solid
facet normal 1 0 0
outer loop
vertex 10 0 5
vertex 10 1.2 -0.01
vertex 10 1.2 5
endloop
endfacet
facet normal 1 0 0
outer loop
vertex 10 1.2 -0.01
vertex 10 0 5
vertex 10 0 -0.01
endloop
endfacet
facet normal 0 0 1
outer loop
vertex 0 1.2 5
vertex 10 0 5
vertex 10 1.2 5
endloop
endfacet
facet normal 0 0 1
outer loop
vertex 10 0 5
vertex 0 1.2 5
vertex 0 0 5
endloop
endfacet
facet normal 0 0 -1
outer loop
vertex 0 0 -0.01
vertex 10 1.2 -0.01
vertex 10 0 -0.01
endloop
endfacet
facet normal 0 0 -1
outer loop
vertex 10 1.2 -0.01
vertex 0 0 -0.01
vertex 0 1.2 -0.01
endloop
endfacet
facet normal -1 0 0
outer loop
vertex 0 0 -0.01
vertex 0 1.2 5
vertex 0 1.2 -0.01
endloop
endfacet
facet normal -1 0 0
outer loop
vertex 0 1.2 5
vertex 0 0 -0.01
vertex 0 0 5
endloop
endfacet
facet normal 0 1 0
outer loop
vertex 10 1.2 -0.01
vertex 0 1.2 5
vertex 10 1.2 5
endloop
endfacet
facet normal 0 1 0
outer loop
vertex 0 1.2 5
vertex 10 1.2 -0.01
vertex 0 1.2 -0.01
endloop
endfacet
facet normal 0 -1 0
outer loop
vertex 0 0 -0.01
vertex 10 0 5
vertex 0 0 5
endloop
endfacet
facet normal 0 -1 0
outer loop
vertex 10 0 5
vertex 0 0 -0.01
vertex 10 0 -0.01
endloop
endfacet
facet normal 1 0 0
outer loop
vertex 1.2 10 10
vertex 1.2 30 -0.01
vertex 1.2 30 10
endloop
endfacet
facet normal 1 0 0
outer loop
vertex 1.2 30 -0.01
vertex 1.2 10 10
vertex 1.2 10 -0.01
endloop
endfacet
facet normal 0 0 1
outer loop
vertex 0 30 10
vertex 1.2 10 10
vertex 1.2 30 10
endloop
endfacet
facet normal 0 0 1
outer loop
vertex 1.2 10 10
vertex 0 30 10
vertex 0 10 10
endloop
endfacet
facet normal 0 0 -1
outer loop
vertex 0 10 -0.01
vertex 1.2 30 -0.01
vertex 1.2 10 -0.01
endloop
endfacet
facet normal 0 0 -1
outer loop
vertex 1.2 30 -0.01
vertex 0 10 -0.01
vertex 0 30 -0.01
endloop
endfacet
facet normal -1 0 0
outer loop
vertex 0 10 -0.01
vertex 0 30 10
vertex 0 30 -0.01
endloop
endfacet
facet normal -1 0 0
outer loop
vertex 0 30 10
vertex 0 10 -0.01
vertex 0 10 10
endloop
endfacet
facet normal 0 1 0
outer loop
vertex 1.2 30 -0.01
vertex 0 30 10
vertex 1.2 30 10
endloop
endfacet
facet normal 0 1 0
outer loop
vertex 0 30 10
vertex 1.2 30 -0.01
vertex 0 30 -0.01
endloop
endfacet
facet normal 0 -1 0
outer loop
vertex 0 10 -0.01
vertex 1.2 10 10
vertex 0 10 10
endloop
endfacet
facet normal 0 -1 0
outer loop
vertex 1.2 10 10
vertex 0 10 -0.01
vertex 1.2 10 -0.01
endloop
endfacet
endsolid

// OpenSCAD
// file: ../../Base/Boxes.scad
// Fischertechnik Box Foundation
// Pre-designed Boxes

use <Constants.scad>

include <PlacementOptions.scad>

box190Width = 190;
box190Depth = 130;
box130Width = 130;
box130Depth = 95;
boxUsageHeight = 33.9;
boxWallThickness = 2.4;
boxBaseThickness = 1.0;

// getBoxWallThickness()
// Gets the wall thickness of a Fischertechnik Box

function getBoxWallThickness() = boxWallThickness;

// Gets the usable height of a fischertechnik box
function getBoxUsageHeight() = boxUsageHeight;

// Gets the thickness of the Fischertechnik box base.
function getBoxBaseThickness() = boxBaseThickness;

// Gets the usable inner space of a Box 190 as an x/y-list
function getBox190Space() = [
    box190Width - 2*getBoxWallThickness(), 
    box190Depth - 2*getBoxWallThickness() ];

// Imports the Fischertechnik empty box 130x190 mm and places it at position 0,0
// 190x130 are the outer sizes, the inner space is slightly smaller. Use getBox190Space() to get the inner sizes.
// This module needs the STL file "Fischertechnik Box 130x190.stl" in the library path.
// The box is positioned that the usable inner space is at the 0,0,0 position. The

module Box190() {
    translate([-getBoxWallThickness(),-getBoxWallThickness(),-getBoxBaseThickness()])
        import("Fischertechnik Box 130x190.stl", convexity=3);
}

// Gets the usable inner space of a Box 130 as an x/y-list
function getBox130Space() = [
    box130Width - 2*getBoxWallThickness(), 
    box130Depth - 2*getBoxWallThickness() ];

// Imports the Fischertechnik empty box 95x130 mm and places it at position 0,0
// 190x130 are the outer sizes, the inner space is slightly smaller. Use getBox190Space() to get the inner sizes.
// This module needs the STL file "Fischertechnik Box 95x130.stl" in the library path.
// The box is positioned that the usable inner space is at the 0,0,0 position. The

module Box130() {
    translate([-getBoxWallThickness(),-getBoxWallThickness(),-getBoxBaseThickness()])
        import("Fischertechnik Box 95x130.stl", convexity=3);
}

// Creates a web at the specified box walls
// corner 0 = LowerLeft, 1 = UpperLeft, 2 = UpperRight, 3 = LowerRight
// side 0 = LeftOfCorner, 1 = RightOfCorner
// distance = Distance in mm from the corner
// box = inner width and depth of the box (default: Box 190)
// webWidth = length of the web (default is 3 mms)
// webThickness = thickness of the web (default is 1 mm)

module BoxWeb(corner, side, distance, box=getBox190Space(), webWidth=3, webThickness=1.0) {
    sink = getBoxWallThickness()/2;

    width = (corner % 2 == 0) ? 
            (side == LeftOfCorner ? webWidth : webThickness) :
            (side == LeftOfCorner ? webThickness : webWidth);

    depth = (corner % 2 == 0) ? 
            (side == RightOfCorner ? webWidth : webThickness) :
            (side == RightOfCorner ? webThickness : webWidth);
    
    xDiff = corner == LowerLeft ? 
                (side == LeftOfCorner ? -sink : distance) :
            (corner == UpperLeft ?                
                (side == LeftOfCorner ? distance : -sink) :
            (corner == UpperRight ?
                (side == LeftOfCorner ? box.x-webWidth+sink : box.x-distance-webThickness) :
                (side == LeftOfCorner ? box.x-distance-webThickness: box.x-webWidth+sink)));

    yDiff = corner == LowerLeft ? 
                (side == RightOfCorner ? -sink : distance) :
            (corner == UpperLeft ?
                (side == RightOfCorner ? box.y-distance : box.y-webWidth+sink) :
            (corner == UpperRight ?
                (side == RightOfCorner ? box.y-webWidth+sink : box.y-distance) :
                (side == RightOfCorner ? distance : -sink)));
    
    translate([xDiff, yDiff, -getExcess()])
        cube([width, depth, boxUsageHeight + 2*getExcess()]);
}
// file: ../../Base/Rotation.scad
// Fischertechnik Box Foundation
// Geometry Helpers Rotation

include <PlacementOptions.scad>

// getRotatedSpace(space, rotation=NoRotation)
// Rotates the space dependent on the specified rotation

function getRotatedSpace(space, rotation=NoRotation) = [
    (rotation == Rotate90 || rotation == Rotate270) ? space.y : space.x,
    (rotation == Rotate90 || rotation == Rotate270) ? space.x : space.y
];

// Rotates the given space around the fixed left lower corner
// space = the space the children needs as width/depth list [width,depth]
// rotation = 0 Rotate0 degrees, 1 Rotate90 degrees, 2 Rotate180 degrees, 3 Rotate270 degrees (equivalent to -90)

module RotateFix(space, rotation=Rotate0) {
    dy = (rotation == Rotate0 || rotation == Rotate270) ? 0 :
        (rotation == Rotate90) ? space.x :
        space.y;
    dx = (rotation < Rotate180) ? 0 :
        (rotation == Rotate180) ? space.x :
        space.y;
    
    translate([dx, dy, 0])
        rotate([0, 0, rotations[rotation]])
            children();
}
// file: ../../Base/Alignment.scad
// Fischertechnik Box Foundation
// Geometry Helpers Alignment

include <PlacementOptions.scad>

// getAlignedX(elementWidth, spaceWidth, align=AlignRight, offset=0)
// Gets the aligned X offset of an element with the given
// width in the given space.
// elementWidth = The width of the element to positon
// spaceWidth = The space where the element should be aligned
// align = 0 AlignLeft, 1 AlignCenter, 2 AlignRight
// offset = an optional offset from the aligned position. When
// aligned left or centered, then positive values are in X direction.
// When aligned right then positive values are in negative X direction.

function getAlignedX(elementWidth, spaceWidth, align=AlignRight, offset=0) =
    (align == AlignLeft) ?
        offset :
        ((align == AlignCenter) ?
        (spaceWidth - elementWidth)/2 + offset :
        spaceWidth - offset - elementWidth);

// getAlignedY(elementDepth, spaceDepth, align=AlignTop, offset=0)
// Gets the aligned Y offset of an element with the given
// depth in the given space.
// elementDepth = The depth of the element to positon
// spaceDepth = The space where the element should be aligned
// align = 0 AlignBottom, 1 AlignCenter, 2 AlignTop
// offset = an optional offset from the aligned position. When
// aligned bottom or centered, then positive values are in Y direction.
// When aligned top then positive values are in negative Y direction.

function getAlignedY(elementDepth, spaceDepth, align=AlignTop, offset=0) =
    (align == AlignBottom) ?
        offset :
        ((align == AlignCenter) ?
        (spaceDepth - elementDepth)/2 + offset :
        spaceDepth - offset - elementDepth);
// file: ../../Base/PlacementOptions.scad
// Fischertechnik Box Foundation
// Placement Options

// Alignment
NoAlign = 0;
AlignLeft = 1;
AlignBottom = 2;
AlignCenter = 3;
AlignRight = 4;
AlignTop = 5;

// Element rotation degree steps
rotations = [0, -90, -180, -270];

// Rotation
NoRotation = 0;
Rotate0 = 0;
Rotate90 = 1;
Rotate180 = 2;
Rotate270 = 3;

// Docking (seen from above)
NoDock = -1;
DockLeft = 0;
DockTop = 1;
DockRight = 2;
DockCorner = 2;
DockBottom = 3;

// Web corners
LowerLeft = 0;
UpperLeft = 1;
UpperRight = 2;
LowerRight = 3;

// Web position relative to corner
LeftOfCorner = 0;
RightOfCorner = 1;
// file: ../../Base/Placement.scad
// Fischertechnik Box Foundation
// Geometry Helpers Placement

use <Constants.scad>
use <Alignment.scad>
use <Rotation.scad>
use <Boxes.scad>

include <PlacementOptions.scad>

// Place(x=0, y=0, elementSpace=[0,0], alignX=AlignLeft, alignY=AlignBottom, rotation=Rotate0, boxSpace=getBox190Space())
// Places the child at the specified position
// y = Y-Position. This is a relative position when an X aligment is specified.
// x = X-Position. This is a relative position when an Y aligment is specified.
// elementSpace = space of the element to be placed [x,y]
// alignX = -1=NoAlign, 0 AlignLeft, 1 AlignCenter, 3 AlignRight (elementSpace and boxSpace required!)
// alignY = -1=NoAlign, 2 AlignBottom, 1 AlignCenter, 4 AlignTop (elementSpace and boxSpace required!)
// rotation = 0 Rotate0 0 degrees, 1 Rotate90 90 degrees, 
// 2 Rotate180 180 degrees, 3 Rotate270 270 degrees (equivalent to -90)
// boxSpace = Inner space of the box where the placement occurs [x,y] - default is Box 190x130 inner space

module Place(x=0, y=0, elementSpace=[0,0], 
  alignX=AlignLeft, alignY=AlignBottom, 
  rotation=NoRotation, boxSpace=getBox190Space()) {

    module Position(x, y, space, rotation=Rotate0) {
        translate([x, y, 0])
            RotateFix(space, rotation)
                children(0);
    }

    space = getRotatedSpace(elementSpace, rotation);
    alignedX = getAlignedX(space.x, boxSpace.x, alignX, x);
    alignedY = getAlignedY(space.y, boxSpace.y, alignY, y);
    Position(alignedX, alignedY, elementSpace, rotation)
        children(0);
}

// Center(space=getBox130Space(), elementSpace=[0,0])
// space = Space where the children is centered. For cylinder use centered=true and no elementSpace.
// elementSpace = space of the element to be centered [x,y]

module Center(space=getBox190Space(), elementSpace=[0,0]) {
    translate([(space.x - elementSpace.x) / 2, (space.y - elementSpace.y) / 2])
        children(0);
}

// CenterHorizontal(width=0, y=0, offset=0, space=getBox130Space())
// space = Space where the children is centered. For cylinder use centered=true and no elementSpace.
// elementSpace = space of the element to be centered [x,y]

module CenterHorizontal(width=0, y=0, offset=0, space=getBox190Space()) {
    translate([(space.x - width) / 2 + offset, y])
        children(0);
}

// CenterVertical(depth=0, x=0, offset=0, space=getBox130Space())
// space = Space where the children is centered. For cylinder use centered=true and no elementSpace.
// elementSpace = space of the element to be centered [x,y]

module CenterVerticalal(depth=0, x=0, offset=0, space=getBox190Space()) {
    translate([x, (space.y - depth) / 2 + offset])
        children(0);
}
// file: ../../Base/Constants.scad
// Fischertechnik Box Foundation
// Constants

// Constant values necessary for multiple elements

// Base constants
dividerThickness = 1.2;
excess = 0.01;
fragments = 90;
tolerance = 0.8;

// Gets the thickness of a divider 
function getDividerThickness() = dividerThickness;

// Gets the excess that is used to merge walls into each other
function getExcess() = excess;

// Gets amount of fragments of a cylinder
function getFragments() = fragments;

// Gets the inner tolerance of a frame to each side
function getTolerance() = tolerance;


// Fischertechnik specific constants
axisDiameter = 4;
axisBottomDiameter = axisDiameter + 1;
standardEdgeDistance = 2.5;
standardWebDistance = 11.5;
standardCornerLength = 15;
tubeWallFactor = 1.6;

// Gets axis diameter
function getAxisDiameter() = axisDiameter;

// Gets axis bottom diameter for thicker part at the bottom
function getAxisBottomDiameter() = axisBottomDiameter;

// gets the standard distance to the wall of the box for dockable frames with webs
function getStandardEdgeDistance() = standardEdgeDistance;

// gets the standard distance of each web to the corner of the dockable frame
function getStandardWebDistance() = standardWebDistance;

// gets the standard length of the corner walls of a dockable frame
function getStandardCornerLength() = standardCornerLength;

// gets the wall thickness of a tube.
function getTubeWallThickness() = tubeWallFactor * getDividerThickness();
// main file
// Fischertechnik Box Foundation
// ModelBase
// Test Wall

use <../../Base/Constants.scad>
use <../../ModelBase/Simple.scad>

Wall([10, getDividerThickness(), 5]);

translate([0, 10])
    Wall([getDividerThickness(), 20, 10]);
